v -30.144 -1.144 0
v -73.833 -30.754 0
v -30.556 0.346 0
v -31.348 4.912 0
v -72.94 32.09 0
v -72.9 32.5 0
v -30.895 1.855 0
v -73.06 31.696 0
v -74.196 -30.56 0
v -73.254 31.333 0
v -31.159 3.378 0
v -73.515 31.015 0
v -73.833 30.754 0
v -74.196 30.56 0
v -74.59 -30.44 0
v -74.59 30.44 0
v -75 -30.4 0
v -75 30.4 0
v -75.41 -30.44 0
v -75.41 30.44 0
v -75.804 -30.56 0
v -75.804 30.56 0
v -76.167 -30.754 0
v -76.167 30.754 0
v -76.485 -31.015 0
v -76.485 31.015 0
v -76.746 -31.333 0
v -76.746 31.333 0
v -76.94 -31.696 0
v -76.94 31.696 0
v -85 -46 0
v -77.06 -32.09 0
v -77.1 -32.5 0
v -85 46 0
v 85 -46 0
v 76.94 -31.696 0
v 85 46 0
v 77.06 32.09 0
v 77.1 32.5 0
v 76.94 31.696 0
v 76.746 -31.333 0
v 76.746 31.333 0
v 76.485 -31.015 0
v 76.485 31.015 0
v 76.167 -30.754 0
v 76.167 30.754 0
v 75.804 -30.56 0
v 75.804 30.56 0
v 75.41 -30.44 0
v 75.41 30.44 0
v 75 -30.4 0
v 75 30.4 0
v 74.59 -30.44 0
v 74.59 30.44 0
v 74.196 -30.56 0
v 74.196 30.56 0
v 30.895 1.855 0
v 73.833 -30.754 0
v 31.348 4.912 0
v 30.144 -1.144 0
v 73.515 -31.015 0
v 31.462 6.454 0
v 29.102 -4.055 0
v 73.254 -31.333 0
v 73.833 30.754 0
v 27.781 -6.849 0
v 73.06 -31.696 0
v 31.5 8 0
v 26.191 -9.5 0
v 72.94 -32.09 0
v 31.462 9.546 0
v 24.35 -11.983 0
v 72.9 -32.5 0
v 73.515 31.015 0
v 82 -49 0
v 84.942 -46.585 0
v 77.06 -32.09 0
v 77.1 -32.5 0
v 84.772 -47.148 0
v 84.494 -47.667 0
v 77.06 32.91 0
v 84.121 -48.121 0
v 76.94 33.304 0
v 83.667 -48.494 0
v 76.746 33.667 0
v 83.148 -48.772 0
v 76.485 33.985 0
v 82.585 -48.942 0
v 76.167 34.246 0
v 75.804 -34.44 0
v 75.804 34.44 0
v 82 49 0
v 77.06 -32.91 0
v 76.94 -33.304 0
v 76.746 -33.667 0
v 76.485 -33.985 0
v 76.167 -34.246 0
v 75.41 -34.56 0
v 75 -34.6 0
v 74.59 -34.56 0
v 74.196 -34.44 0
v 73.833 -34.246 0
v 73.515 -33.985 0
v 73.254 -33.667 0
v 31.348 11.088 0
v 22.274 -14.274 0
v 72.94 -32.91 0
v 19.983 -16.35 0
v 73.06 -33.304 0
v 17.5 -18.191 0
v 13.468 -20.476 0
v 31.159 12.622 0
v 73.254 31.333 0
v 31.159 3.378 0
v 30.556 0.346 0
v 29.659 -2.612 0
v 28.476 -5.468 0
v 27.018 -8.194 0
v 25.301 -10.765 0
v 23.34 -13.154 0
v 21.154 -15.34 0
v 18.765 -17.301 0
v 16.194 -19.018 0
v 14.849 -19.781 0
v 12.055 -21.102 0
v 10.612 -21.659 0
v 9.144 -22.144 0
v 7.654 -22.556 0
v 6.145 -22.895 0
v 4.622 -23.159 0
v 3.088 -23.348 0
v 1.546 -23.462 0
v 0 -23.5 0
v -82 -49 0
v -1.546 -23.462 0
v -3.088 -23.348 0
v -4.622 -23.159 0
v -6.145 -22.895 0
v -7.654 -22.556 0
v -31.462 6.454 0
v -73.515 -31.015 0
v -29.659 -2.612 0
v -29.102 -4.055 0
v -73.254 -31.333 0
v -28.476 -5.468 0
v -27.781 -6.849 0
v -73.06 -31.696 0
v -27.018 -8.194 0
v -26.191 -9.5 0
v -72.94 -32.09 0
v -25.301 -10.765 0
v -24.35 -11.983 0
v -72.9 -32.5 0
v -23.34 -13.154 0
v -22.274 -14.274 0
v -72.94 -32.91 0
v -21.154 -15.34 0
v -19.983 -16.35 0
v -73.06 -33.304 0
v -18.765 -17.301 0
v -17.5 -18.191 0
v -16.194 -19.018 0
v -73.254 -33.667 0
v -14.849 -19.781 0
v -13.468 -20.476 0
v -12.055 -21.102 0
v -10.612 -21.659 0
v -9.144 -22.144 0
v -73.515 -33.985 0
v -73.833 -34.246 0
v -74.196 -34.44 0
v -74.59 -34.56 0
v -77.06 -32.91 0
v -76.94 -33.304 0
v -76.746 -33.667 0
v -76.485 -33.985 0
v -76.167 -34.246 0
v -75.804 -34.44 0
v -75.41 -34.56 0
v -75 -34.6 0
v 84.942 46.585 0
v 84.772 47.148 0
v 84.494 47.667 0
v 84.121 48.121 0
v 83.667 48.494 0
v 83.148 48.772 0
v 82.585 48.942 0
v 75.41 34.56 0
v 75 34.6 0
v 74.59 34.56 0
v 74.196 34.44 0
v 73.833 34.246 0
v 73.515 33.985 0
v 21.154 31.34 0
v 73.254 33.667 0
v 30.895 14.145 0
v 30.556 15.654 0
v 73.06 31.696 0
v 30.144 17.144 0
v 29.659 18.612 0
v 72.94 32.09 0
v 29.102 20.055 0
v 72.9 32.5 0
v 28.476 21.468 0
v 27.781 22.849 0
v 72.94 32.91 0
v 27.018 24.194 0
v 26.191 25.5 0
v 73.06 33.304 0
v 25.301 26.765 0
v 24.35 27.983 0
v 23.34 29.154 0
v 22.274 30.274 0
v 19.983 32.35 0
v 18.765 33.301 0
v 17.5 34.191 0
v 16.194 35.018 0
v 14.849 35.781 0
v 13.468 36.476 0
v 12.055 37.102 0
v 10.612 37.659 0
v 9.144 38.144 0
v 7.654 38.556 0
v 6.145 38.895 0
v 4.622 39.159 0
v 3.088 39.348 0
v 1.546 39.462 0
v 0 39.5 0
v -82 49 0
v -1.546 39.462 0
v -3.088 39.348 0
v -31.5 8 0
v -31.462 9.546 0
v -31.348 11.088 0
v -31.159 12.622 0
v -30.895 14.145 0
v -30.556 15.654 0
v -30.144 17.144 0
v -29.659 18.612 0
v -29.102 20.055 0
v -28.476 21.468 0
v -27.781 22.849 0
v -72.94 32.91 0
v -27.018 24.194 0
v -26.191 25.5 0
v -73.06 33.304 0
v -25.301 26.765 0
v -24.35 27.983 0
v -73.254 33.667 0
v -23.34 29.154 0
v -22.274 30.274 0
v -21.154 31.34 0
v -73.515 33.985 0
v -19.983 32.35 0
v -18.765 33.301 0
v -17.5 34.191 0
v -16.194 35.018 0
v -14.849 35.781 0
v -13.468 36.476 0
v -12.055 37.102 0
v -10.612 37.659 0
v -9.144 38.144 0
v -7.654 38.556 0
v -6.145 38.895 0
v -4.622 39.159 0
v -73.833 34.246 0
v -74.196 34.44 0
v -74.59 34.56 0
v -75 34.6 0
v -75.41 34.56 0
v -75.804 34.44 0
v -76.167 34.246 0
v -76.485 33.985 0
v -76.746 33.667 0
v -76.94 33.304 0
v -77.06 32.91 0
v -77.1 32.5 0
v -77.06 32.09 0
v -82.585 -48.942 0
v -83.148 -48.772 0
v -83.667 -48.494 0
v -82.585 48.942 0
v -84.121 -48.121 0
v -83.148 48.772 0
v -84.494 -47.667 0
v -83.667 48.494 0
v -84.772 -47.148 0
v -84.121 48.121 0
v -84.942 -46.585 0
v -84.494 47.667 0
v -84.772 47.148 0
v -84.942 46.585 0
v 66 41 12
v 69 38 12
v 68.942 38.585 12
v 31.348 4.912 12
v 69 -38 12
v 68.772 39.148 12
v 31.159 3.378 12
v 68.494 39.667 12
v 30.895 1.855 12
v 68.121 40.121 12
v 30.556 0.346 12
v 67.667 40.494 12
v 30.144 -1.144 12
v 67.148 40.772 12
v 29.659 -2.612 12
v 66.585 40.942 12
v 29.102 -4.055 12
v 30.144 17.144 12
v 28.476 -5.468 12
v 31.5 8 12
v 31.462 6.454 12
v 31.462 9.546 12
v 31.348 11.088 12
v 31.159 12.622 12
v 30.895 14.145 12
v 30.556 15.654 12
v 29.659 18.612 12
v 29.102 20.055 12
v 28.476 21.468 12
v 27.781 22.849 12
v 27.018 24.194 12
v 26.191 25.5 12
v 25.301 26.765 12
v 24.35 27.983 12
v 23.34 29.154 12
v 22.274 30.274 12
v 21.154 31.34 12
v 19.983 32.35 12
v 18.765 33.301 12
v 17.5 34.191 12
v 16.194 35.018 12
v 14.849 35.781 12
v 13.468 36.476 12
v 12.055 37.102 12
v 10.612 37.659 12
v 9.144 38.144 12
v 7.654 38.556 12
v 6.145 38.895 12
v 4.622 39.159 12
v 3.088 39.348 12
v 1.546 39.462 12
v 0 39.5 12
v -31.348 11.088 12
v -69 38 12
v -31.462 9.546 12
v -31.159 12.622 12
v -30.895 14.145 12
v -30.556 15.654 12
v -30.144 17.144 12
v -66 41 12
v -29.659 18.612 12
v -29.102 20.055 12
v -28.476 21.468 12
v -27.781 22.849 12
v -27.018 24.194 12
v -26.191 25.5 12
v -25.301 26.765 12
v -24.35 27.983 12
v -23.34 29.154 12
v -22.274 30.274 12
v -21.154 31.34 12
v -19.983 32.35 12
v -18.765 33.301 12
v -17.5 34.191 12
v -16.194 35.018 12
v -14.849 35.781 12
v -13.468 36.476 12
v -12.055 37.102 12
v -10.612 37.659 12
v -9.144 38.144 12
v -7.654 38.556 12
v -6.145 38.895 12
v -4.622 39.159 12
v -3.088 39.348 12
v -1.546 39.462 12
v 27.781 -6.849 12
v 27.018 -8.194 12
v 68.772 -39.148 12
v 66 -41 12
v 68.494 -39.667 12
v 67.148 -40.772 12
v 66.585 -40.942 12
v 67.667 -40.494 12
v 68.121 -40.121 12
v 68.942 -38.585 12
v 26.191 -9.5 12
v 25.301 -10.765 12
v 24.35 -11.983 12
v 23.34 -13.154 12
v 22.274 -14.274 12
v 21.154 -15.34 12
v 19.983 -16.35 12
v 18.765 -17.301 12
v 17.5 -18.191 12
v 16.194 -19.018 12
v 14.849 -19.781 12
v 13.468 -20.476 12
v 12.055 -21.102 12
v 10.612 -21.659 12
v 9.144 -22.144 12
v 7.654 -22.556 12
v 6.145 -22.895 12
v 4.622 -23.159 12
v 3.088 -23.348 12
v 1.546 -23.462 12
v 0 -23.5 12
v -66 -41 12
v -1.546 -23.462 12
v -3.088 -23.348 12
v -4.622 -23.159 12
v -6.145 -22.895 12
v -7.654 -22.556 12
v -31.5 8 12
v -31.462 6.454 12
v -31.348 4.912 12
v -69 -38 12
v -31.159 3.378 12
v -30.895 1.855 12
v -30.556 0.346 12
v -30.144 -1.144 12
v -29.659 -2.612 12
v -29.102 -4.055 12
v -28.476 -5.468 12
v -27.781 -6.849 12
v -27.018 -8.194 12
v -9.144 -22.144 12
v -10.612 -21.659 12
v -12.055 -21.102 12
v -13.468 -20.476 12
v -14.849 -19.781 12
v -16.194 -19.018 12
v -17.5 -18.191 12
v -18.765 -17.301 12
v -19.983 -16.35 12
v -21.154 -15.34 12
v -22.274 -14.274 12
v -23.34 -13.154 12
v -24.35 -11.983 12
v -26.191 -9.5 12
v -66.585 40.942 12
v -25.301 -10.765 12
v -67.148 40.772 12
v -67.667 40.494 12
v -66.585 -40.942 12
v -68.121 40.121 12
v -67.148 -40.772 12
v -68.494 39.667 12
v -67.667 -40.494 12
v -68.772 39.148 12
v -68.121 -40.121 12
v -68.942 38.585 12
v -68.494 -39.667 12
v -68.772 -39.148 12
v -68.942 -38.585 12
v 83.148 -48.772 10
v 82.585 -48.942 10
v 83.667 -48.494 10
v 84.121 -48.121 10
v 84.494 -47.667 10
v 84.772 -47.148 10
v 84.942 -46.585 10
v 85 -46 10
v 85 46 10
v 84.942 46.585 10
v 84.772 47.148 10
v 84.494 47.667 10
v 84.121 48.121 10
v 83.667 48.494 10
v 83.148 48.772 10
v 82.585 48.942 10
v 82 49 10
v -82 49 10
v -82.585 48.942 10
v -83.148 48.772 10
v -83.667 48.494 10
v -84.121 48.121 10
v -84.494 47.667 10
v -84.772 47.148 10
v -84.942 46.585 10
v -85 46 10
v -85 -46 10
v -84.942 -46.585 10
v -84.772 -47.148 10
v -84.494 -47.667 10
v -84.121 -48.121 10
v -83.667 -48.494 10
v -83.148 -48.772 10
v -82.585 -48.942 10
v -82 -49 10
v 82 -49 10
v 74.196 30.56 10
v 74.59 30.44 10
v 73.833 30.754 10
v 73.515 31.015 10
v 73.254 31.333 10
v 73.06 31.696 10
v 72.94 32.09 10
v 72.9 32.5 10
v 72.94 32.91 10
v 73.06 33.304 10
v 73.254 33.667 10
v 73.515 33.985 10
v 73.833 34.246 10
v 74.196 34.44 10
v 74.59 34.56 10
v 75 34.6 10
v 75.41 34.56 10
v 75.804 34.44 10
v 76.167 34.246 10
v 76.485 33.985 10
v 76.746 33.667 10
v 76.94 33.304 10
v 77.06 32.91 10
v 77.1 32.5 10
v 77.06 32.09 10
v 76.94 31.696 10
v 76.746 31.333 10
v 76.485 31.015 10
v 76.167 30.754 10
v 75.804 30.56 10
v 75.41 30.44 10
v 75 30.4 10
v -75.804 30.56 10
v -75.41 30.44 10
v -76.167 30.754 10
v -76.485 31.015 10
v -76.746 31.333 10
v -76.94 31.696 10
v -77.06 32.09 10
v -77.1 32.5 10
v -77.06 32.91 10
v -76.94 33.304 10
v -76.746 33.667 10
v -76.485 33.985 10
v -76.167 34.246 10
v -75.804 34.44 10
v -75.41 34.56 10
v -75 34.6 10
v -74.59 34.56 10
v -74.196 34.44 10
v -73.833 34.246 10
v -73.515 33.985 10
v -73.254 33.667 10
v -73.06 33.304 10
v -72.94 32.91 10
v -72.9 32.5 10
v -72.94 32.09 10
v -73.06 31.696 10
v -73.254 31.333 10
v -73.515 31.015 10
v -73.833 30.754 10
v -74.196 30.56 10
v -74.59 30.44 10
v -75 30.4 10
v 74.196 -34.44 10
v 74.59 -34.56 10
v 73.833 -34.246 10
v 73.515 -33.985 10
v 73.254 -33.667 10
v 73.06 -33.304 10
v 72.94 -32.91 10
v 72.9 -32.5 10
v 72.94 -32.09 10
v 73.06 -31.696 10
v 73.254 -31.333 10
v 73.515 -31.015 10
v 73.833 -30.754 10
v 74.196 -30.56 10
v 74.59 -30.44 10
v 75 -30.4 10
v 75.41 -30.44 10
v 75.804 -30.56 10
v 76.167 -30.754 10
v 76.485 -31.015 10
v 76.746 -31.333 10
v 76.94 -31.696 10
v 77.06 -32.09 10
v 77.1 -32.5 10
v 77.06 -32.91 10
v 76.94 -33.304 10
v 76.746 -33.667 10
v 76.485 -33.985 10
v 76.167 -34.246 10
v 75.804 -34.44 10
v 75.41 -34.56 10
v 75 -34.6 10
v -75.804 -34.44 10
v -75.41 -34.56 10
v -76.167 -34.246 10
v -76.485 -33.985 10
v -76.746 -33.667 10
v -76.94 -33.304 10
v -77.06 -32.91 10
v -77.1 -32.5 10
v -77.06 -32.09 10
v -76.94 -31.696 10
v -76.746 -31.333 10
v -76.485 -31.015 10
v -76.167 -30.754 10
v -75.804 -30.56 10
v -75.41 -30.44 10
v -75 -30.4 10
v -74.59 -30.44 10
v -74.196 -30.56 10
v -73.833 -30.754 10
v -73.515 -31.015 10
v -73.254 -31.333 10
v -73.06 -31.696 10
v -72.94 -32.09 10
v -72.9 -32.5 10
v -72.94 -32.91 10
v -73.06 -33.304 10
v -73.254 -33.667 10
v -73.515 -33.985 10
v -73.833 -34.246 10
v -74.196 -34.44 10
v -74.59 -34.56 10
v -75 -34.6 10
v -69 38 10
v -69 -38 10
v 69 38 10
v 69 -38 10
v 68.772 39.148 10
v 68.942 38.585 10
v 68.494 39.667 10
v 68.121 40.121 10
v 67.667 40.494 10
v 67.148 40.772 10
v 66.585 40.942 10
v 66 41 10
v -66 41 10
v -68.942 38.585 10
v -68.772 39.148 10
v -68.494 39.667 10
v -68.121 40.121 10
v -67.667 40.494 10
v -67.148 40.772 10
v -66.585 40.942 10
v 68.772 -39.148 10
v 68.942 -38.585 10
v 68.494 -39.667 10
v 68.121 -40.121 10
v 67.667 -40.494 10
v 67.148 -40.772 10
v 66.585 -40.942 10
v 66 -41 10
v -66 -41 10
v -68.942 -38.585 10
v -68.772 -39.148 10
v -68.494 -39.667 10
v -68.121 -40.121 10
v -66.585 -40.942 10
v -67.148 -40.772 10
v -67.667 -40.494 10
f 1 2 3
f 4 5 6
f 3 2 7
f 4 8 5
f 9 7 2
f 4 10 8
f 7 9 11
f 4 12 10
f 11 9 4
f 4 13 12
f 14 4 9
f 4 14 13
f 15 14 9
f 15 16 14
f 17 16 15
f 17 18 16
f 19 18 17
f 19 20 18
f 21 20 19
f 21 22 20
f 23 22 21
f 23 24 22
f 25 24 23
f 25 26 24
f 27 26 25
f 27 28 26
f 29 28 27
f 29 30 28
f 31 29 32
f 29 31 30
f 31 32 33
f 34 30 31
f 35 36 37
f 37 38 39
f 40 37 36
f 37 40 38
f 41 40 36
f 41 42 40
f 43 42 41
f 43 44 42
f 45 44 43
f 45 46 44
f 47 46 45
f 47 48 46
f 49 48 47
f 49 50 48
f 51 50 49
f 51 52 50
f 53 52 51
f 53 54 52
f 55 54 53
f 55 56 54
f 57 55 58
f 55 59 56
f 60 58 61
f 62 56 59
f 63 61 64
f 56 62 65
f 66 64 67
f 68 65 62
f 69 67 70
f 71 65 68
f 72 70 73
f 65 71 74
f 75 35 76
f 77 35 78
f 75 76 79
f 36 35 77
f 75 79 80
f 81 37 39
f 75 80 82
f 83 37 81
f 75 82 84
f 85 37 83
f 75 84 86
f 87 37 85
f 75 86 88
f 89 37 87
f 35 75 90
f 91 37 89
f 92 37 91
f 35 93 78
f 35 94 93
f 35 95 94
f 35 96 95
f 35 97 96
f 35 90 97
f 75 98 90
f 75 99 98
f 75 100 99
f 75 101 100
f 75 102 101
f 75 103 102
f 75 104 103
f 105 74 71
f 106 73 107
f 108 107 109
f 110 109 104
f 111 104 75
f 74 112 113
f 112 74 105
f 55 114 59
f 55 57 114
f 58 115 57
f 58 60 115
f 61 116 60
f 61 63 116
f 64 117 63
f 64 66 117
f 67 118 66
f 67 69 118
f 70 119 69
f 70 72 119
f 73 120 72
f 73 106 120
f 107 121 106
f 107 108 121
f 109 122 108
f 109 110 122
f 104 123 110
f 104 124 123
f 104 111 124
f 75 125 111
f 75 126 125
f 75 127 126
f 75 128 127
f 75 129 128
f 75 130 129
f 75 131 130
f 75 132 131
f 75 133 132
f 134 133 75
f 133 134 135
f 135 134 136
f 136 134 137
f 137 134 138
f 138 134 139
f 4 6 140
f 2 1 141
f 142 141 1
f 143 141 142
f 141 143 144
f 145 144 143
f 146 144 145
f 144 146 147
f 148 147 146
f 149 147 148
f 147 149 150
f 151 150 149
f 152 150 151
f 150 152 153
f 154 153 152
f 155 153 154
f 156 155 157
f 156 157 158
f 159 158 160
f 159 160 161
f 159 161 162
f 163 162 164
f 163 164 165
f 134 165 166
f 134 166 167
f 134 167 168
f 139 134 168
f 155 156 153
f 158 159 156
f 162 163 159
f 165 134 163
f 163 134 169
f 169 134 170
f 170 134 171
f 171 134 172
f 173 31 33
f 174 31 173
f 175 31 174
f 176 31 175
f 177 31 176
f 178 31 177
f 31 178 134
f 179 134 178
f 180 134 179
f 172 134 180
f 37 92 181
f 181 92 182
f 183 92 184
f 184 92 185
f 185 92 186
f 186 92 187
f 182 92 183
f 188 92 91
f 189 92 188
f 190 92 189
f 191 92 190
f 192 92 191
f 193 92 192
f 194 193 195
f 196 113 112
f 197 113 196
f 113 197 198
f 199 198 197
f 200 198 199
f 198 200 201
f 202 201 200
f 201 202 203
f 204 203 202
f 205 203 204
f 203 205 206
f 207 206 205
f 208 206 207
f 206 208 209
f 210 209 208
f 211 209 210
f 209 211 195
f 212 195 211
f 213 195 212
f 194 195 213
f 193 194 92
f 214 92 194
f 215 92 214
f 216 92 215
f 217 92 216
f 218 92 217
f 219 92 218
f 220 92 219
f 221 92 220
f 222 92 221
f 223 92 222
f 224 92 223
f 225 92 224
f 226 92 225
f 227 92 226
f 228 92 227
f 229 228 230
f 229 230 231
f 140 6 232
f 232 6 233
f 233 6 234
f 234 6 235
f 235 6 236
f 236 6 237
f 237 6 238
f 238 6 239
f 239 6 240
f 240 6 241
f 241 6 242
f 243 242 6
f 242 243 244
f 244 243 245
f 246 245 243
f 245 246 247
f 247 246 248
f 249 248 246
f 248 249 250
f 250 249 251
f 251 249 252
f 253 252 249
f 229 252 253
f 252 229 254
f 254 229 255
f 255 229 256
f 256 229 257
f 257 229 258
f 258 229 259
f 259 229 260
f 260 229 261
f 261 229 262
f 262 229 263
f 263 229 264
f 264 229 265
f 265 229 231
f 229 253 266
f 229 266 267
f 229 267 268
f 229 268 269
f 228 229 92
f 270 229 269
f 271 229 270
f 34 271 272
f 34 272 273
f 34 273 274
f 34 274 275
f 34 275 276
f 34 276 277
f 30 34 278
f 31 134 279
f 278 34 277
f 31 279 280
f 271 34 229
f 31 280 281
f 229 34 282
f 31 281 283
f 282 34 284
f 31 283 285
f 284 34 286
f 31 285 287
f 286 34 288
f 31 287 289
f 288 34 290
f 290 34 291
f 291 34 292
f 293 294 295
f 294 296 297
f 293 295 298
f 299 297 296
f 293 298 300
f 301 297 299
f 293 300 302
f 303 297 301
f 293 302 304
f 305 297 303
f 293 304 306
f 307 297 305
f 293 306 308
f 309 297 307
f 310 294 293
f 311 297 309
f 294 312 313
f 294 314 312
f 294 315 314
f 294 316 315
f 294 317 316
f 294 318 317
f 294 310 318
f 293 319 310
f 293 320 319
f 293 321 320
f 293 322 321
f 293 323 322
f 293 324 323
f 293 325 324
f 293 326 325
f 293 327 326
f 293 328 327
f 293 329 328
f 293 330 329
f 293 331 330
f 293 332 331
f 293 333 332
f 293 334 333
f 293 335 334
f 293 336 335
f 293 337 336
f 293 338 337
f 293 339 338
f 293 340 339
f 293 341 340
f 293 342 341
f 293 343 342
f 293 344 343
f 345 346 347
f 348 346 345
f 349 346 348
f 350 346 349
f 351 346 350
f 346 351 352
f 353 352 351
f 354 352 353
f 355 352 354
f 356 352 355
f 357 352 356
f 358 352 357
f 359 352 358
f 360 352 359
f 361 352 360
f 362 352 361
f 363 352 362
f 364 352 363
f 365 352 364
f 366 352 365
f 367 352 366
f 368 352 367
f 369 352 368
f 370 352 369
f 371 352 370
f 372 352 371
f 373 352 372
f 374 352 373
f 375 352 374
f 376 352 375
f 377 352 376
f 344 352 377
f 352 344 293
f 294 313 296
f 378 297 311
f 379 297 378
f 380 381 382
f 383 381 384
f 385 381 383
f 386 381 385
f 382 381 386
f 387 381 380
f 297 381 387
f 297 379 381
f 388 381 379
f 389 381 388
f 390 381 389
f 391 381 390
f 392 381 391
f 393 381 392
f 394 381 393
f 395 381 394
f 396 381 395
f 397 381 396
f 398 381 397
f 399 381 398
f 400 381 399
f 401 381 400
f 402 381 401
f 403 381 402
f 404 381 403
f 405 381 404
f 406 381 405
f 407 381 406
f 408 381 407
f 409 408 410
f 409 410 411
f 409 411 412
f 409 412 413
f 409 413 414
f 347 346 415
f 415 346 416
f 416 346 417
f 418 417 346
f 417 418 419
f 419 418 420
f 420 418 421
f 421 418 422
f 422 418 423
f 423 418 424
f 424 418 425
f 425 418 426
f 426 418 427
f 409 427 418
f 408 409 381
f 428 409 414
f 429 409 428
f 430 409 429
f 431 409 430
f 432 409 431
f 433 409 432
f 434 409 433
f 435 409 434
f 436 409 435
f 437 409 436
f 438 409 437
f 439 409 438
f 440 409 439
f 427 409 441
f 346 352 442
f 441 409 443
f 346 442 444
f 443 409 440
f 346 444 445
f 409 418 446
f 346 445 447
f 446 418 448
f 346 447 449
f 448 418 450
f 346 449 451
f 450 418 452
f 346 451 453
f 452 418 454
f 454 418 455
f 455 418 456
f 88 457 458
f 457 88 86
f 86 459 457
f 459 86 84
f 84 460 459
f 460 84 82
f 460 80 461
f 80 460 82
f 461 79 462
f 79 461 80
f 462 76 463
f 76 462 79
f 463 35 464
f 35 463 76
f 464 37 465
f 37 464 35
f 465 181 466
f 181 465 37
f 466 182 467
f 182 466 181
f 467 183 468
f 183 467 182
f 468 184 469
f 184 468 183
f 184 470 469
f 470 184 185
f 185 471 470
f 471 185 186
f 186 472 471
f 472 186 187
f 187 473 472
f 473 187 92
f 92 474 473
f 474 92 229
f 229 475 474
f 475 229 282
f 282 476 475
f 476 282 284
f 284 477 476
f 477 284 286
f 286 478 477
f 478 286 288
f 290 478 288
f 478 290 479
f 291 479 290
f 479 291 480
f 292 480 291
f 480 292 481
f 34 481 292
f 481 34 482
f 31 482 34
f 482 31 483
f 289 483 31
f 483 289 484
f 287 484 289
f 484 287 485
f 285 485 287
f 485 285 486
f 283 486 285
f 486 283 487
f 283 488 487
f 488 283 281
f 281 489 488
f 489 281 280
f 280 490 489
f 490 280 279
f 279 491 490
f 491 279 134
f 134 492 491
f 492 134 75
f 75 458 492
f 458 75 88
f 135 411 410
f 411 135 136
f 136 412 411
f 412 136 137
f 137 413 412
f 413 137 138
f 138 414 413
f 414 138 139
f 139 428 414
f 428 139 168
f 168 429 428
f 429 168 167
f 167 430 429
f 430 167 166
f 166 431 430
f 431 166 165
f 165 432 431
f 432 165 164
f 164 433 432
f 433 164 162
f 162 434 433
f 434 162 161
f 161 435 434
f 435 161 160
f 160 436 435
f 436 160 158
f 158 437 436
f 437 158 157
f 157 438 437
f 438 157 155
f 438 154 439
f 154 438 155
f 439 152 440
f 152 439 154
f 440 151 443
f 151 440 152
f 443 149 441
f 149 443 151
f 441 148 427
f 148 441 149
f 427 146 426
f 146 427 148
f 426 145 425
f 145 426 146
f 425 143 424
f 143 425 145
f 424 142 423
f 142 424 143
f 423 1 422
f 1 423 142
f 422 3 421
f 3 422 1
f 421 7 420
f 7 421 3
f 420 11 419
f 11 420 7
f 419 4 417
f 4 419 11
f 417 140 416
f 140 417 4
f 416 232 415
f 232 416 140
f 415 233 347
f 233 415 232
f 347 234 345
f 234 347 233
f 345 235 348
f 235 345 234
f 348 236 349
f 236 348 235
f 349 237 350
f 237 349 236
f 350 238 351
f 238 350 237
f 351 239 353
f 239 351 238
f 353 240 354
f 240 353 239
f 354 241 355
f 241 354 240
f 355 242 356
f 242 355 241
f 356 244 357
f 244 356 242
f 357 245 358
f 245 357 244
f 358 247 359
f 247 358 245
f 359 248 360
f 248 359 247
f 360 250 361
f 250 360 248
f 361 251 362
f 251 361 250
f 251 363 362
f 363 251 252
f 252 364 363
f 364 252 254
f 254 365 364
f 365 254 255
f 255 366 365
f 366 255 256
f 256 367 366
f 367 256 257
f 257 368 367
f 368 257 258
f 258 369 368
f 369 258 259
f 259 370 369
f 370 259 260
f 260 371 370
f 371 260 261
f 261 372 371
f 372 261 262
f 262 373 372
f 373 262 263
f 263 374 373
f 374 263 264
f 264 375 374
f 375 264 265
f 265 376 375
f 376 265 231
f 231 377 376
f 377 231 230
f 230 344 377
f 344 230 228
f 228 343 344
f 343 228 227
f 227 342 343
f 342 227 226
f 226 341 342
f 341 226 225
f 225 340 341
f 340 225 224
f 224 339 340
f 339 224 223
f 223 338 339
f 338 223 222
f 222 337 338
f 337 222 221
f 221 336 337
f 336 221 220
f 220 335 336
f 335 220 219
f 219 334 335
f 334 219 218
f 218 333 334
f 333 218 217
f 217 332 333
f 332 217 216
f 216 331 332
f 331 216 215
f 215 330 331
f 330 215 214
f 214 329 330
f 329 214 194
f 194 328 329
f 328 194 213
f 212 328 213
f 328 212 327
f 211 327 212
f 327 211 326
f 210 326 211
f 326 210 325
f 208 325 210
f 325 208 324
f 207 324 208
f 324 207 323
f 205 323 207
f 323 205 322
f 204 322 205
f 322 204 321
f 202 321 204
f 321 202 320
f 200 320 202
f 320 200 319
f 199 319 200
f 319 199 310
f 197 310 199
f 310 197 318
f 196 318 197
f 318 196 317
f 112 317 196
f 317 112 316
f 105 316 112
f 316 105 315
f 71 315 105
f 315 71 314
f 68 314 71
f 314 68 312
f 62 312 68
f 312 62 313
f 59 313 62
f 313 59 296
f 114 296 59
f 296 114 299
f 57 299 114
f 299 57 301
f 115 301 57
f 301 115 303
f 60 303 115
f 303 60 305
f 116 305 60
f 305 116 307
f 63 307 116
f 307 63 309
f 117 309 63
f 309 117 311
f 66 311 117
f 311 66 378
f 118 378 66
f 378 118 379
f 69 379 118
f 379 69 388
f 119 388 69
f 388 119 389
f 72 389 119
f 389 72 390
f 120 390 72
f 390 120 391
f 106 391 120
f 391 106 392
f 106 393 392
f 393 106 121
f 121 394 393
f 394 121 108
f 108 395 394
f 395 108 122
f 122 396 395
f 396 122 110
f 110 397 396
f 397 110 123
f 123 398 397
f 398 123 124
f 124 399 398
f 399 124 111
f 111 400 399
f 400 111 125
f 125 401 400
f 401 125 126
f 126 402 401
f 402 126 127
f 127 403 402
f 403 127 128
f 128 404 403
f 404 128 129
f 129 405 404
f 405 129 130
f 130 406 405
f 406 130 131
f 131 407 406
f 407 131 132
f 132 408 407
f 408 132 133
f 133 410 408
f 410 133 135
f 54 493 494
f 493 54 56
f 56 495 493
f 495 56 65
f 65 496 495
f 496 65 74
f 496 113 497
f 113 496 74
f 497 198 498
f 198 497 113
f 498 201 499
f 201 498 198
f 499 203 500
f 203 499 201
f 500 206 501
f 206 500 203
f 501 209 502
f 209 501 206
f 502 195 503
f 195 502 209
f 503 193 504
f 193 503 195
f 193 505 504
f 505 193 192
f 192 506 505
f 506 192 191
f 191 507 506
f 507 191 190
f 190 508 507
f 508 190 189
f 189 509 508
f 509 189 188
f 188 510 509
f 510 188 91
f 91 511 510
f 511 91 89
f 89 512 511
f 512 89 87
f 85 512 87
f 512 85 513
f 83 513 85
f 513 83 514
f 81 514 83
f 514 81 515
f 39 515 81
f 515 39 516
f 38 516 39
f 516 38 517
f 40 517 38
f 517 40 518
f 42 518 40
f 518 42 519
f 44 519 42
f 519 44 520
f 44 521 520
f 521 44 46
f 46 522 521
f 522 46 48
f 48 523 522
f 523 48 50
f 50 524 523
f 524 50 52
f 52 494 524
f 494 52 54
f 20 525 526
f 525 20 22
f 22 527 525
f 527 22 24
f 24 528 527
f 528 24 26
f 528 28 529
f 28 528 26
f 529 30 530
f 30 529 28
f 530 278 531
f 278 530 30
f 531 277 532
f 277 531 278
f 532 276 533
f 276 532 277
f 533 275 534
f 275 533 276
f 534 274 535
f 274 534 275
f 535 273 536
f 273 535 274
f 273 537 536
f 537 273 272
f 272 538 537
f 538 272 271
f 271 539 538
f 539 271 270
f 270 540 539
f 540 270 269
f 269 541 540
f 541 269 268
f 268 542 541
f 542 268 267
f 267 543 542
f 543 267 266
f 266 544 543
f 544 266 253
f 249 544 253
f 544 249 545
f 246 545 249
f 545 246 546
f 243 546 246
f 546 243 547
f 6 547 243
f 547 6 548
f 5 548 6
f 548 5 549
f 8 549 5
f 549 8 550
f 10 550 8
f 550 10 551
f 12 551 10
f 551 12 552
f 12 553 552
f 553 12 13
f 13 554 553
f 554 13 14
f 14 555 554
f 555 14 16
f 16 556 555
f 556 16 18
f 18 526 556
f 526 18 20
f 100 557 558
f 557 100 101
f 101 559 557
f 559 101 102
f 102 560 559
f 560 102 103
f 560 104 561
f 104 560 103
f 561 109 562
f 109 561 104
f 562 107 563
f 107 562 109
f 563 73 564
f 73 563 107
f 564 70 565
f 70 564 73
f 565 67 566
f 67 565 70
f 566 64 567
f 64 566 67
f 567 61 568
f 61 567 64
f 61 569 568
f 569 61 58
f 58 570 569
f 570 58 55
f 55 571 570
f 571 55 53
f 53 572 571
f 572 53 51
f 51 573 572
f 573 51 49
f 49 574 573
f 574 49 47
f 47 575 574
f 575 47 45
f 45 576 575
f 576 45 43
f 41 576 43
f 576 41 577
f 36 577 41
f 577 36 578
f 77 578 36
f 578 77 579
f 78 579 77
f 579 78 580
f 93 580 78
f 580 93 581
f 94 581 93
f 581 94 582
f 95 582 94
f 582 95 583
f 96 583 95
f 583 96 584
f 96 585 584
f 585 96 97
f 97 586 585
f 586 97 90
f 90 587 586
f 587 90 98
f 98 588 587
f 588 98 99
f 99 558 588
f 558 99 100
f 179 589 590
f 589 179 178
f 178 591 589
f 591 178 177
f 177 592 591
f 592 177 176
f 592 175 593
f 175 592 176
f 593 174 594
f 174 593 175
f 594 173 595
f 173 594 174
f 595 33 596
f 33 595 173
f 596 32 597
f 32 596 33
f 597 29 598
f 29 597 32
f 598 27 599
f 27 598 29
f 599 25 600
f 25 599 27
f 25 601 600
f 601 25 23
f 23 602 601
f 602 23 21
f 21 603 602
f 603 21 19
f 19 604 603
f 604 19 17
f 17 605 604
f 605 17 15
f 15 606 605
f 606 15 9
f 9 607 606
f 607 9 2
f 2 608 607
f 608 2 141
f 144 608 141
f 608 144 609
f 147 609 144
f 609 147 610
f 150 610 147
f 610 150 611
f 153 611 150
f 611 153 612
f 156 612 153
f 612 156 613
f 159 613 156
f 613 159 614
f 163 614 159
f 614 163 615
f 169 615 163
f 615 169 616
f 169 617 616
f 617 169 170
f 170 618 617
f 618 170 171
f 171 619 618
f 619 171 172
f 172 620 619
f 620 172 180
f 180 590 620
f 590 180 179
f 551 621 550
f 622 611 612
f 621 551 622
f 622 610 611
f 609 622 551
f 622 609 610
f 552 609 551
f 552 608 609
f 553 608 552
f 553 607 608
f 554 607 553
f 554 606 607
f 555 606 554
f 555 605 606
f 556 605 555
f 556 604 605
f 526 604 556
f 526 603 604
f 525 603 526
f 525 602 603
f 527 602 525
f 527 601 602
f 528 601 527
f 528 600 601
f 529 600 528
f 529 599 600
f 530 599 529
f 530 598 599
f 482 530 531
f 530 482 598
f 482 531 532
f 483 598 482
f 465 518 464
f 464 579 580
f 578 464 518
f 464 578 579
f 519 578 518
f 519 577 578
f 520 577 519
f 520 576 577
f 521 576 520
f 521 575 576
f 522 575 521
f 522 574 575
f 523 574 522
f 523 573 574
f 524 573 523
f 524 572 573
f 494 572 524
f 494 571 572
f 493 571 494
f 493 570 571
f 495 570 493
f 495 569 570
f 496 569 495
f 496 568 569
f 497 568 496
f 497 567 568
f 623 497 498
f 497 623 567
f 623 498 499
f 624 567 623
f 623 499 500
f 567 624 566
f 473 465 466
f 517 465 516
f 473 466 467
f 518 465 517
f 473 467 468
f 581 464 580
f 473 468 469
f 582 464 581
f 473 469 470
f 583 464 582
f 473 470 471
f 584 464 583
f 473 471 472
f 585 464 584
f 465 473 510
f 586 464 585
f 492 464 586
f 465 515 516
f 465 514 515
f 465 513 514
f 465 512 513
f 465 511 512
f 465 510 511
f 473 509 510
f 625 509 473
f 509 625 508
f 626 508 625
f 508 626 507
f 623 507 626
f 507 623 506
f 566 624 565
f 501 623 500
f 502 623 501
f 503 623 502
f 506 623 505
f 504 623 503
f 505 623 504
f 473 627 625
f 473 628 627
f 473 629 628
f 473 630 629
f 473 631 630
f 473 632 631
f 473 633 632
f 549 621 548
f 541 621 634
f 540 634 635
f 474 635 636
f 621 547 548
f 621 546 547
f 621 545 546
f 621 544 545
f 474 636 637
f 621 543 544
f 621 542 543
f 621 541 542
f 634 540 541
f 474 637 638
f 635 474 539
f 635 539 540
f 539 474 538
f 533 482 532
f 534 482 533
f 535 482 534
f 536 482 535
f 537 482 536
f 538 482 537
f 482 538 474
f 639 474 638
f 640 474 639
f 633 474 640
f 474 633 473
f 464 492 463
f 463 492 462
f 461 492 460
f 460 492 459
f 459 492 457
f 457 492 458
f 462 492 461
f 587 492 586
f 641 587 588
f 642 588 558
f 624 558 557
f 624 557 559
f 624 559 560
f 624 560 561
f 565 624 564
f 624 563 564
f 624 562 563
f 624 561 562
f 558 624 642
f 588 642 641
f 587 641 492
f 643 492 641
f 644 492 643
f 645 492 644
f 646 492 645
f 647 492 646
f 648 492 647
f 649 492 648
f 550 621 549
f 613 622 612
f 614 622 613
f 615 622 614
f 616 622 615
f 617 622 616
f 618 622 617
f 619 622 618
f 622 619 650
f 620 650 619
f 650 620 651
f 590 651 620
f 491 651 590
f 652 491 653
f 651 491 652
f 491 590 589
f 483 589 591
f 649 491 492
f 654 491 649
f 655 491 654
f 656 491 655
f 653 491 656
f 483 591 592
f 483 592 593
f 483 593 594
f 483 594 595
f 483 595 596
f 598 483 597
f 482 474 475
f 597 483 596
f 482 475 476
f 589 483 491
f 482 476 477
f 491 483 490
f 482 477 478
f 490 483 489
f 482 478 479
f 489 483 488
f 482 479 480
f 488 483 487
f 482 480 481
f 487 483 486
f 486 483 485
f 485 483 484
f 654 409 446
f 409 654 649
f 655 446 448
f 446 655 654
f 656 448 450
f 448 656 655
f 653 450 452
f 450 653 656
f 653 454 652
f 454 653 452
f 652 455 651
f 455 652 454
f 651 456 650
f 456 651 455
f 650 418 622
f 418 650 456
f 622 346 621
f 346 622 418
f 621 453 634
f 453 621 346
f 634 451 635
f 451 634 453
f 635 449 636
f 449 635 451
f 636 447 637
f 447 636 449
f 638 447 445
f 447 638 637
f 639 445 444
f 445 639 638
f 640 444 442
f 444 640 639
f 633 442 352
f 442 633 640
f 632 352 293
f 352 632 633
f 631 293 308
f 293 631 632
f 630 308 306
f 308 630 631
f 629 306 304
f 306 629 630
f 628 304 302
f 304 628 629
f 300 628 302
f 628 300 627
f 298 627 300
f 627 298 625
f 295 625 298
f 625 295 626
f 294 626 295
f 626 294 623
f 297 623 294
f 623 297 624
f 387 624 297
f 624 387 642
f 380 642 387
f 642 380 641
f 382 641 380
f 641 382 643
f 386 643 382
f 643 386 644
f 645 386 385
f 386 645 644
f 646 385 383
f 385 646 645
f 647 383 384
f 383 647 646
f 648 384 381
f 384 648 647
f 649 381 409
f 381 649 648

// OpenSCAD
// file: port_lib.scad
gMaterialThick = 12;
gCutDepth = -gMaterialThick - 0.2;
gPocketDepth = 2;
gBitSize = 4.0;

gSpacingX = 150;
gSpacingY = 65;
gExtraX = 10;
gExtraY = 16.5;
gHoleDia = 4.2;
gPortDia = 63;
gRabbetSize = [138,82];

module Outline() {
  offset(r=3,$fn=32) offset(delta=-3)
    square([gSpacingX+gExtraX*2,gSpacingY+gExtraY*2], center=true);
}

module Holes() {
  for(x_scale=[1,-1],y_scale=[1,-1]) scale([x_scale,y_scale])
    translate([gSpacingX/2,gSpacingY/2]) circle(d=gHoleDia,$fn=32);
}

module Port() {
  // other side of the adapter this is sized for can't hit the table, and is
  // 106mm dia.
  translate([0,8]) circle(d=gPortDia,$fn=128);
}

module InsetRabbet() {
  difference() {
    offset(delta=2) Outline();
    offset(r=3,$fn=32) offset(delta=-3) square(gRabbetSize, center=true);
  }
}
// main file
include <port_lib.scad>;

difference(){ 
  linear_extrude(height=gMaterialThick,convexity=8) difference() {
    Outline();
    Holes();
    Port();
  }
  translate([0,0,gMaterialThick-gPocketDepth])
    linear_extrude(height=gMaterialThick, convexity=4) InsetRabbet();
}
